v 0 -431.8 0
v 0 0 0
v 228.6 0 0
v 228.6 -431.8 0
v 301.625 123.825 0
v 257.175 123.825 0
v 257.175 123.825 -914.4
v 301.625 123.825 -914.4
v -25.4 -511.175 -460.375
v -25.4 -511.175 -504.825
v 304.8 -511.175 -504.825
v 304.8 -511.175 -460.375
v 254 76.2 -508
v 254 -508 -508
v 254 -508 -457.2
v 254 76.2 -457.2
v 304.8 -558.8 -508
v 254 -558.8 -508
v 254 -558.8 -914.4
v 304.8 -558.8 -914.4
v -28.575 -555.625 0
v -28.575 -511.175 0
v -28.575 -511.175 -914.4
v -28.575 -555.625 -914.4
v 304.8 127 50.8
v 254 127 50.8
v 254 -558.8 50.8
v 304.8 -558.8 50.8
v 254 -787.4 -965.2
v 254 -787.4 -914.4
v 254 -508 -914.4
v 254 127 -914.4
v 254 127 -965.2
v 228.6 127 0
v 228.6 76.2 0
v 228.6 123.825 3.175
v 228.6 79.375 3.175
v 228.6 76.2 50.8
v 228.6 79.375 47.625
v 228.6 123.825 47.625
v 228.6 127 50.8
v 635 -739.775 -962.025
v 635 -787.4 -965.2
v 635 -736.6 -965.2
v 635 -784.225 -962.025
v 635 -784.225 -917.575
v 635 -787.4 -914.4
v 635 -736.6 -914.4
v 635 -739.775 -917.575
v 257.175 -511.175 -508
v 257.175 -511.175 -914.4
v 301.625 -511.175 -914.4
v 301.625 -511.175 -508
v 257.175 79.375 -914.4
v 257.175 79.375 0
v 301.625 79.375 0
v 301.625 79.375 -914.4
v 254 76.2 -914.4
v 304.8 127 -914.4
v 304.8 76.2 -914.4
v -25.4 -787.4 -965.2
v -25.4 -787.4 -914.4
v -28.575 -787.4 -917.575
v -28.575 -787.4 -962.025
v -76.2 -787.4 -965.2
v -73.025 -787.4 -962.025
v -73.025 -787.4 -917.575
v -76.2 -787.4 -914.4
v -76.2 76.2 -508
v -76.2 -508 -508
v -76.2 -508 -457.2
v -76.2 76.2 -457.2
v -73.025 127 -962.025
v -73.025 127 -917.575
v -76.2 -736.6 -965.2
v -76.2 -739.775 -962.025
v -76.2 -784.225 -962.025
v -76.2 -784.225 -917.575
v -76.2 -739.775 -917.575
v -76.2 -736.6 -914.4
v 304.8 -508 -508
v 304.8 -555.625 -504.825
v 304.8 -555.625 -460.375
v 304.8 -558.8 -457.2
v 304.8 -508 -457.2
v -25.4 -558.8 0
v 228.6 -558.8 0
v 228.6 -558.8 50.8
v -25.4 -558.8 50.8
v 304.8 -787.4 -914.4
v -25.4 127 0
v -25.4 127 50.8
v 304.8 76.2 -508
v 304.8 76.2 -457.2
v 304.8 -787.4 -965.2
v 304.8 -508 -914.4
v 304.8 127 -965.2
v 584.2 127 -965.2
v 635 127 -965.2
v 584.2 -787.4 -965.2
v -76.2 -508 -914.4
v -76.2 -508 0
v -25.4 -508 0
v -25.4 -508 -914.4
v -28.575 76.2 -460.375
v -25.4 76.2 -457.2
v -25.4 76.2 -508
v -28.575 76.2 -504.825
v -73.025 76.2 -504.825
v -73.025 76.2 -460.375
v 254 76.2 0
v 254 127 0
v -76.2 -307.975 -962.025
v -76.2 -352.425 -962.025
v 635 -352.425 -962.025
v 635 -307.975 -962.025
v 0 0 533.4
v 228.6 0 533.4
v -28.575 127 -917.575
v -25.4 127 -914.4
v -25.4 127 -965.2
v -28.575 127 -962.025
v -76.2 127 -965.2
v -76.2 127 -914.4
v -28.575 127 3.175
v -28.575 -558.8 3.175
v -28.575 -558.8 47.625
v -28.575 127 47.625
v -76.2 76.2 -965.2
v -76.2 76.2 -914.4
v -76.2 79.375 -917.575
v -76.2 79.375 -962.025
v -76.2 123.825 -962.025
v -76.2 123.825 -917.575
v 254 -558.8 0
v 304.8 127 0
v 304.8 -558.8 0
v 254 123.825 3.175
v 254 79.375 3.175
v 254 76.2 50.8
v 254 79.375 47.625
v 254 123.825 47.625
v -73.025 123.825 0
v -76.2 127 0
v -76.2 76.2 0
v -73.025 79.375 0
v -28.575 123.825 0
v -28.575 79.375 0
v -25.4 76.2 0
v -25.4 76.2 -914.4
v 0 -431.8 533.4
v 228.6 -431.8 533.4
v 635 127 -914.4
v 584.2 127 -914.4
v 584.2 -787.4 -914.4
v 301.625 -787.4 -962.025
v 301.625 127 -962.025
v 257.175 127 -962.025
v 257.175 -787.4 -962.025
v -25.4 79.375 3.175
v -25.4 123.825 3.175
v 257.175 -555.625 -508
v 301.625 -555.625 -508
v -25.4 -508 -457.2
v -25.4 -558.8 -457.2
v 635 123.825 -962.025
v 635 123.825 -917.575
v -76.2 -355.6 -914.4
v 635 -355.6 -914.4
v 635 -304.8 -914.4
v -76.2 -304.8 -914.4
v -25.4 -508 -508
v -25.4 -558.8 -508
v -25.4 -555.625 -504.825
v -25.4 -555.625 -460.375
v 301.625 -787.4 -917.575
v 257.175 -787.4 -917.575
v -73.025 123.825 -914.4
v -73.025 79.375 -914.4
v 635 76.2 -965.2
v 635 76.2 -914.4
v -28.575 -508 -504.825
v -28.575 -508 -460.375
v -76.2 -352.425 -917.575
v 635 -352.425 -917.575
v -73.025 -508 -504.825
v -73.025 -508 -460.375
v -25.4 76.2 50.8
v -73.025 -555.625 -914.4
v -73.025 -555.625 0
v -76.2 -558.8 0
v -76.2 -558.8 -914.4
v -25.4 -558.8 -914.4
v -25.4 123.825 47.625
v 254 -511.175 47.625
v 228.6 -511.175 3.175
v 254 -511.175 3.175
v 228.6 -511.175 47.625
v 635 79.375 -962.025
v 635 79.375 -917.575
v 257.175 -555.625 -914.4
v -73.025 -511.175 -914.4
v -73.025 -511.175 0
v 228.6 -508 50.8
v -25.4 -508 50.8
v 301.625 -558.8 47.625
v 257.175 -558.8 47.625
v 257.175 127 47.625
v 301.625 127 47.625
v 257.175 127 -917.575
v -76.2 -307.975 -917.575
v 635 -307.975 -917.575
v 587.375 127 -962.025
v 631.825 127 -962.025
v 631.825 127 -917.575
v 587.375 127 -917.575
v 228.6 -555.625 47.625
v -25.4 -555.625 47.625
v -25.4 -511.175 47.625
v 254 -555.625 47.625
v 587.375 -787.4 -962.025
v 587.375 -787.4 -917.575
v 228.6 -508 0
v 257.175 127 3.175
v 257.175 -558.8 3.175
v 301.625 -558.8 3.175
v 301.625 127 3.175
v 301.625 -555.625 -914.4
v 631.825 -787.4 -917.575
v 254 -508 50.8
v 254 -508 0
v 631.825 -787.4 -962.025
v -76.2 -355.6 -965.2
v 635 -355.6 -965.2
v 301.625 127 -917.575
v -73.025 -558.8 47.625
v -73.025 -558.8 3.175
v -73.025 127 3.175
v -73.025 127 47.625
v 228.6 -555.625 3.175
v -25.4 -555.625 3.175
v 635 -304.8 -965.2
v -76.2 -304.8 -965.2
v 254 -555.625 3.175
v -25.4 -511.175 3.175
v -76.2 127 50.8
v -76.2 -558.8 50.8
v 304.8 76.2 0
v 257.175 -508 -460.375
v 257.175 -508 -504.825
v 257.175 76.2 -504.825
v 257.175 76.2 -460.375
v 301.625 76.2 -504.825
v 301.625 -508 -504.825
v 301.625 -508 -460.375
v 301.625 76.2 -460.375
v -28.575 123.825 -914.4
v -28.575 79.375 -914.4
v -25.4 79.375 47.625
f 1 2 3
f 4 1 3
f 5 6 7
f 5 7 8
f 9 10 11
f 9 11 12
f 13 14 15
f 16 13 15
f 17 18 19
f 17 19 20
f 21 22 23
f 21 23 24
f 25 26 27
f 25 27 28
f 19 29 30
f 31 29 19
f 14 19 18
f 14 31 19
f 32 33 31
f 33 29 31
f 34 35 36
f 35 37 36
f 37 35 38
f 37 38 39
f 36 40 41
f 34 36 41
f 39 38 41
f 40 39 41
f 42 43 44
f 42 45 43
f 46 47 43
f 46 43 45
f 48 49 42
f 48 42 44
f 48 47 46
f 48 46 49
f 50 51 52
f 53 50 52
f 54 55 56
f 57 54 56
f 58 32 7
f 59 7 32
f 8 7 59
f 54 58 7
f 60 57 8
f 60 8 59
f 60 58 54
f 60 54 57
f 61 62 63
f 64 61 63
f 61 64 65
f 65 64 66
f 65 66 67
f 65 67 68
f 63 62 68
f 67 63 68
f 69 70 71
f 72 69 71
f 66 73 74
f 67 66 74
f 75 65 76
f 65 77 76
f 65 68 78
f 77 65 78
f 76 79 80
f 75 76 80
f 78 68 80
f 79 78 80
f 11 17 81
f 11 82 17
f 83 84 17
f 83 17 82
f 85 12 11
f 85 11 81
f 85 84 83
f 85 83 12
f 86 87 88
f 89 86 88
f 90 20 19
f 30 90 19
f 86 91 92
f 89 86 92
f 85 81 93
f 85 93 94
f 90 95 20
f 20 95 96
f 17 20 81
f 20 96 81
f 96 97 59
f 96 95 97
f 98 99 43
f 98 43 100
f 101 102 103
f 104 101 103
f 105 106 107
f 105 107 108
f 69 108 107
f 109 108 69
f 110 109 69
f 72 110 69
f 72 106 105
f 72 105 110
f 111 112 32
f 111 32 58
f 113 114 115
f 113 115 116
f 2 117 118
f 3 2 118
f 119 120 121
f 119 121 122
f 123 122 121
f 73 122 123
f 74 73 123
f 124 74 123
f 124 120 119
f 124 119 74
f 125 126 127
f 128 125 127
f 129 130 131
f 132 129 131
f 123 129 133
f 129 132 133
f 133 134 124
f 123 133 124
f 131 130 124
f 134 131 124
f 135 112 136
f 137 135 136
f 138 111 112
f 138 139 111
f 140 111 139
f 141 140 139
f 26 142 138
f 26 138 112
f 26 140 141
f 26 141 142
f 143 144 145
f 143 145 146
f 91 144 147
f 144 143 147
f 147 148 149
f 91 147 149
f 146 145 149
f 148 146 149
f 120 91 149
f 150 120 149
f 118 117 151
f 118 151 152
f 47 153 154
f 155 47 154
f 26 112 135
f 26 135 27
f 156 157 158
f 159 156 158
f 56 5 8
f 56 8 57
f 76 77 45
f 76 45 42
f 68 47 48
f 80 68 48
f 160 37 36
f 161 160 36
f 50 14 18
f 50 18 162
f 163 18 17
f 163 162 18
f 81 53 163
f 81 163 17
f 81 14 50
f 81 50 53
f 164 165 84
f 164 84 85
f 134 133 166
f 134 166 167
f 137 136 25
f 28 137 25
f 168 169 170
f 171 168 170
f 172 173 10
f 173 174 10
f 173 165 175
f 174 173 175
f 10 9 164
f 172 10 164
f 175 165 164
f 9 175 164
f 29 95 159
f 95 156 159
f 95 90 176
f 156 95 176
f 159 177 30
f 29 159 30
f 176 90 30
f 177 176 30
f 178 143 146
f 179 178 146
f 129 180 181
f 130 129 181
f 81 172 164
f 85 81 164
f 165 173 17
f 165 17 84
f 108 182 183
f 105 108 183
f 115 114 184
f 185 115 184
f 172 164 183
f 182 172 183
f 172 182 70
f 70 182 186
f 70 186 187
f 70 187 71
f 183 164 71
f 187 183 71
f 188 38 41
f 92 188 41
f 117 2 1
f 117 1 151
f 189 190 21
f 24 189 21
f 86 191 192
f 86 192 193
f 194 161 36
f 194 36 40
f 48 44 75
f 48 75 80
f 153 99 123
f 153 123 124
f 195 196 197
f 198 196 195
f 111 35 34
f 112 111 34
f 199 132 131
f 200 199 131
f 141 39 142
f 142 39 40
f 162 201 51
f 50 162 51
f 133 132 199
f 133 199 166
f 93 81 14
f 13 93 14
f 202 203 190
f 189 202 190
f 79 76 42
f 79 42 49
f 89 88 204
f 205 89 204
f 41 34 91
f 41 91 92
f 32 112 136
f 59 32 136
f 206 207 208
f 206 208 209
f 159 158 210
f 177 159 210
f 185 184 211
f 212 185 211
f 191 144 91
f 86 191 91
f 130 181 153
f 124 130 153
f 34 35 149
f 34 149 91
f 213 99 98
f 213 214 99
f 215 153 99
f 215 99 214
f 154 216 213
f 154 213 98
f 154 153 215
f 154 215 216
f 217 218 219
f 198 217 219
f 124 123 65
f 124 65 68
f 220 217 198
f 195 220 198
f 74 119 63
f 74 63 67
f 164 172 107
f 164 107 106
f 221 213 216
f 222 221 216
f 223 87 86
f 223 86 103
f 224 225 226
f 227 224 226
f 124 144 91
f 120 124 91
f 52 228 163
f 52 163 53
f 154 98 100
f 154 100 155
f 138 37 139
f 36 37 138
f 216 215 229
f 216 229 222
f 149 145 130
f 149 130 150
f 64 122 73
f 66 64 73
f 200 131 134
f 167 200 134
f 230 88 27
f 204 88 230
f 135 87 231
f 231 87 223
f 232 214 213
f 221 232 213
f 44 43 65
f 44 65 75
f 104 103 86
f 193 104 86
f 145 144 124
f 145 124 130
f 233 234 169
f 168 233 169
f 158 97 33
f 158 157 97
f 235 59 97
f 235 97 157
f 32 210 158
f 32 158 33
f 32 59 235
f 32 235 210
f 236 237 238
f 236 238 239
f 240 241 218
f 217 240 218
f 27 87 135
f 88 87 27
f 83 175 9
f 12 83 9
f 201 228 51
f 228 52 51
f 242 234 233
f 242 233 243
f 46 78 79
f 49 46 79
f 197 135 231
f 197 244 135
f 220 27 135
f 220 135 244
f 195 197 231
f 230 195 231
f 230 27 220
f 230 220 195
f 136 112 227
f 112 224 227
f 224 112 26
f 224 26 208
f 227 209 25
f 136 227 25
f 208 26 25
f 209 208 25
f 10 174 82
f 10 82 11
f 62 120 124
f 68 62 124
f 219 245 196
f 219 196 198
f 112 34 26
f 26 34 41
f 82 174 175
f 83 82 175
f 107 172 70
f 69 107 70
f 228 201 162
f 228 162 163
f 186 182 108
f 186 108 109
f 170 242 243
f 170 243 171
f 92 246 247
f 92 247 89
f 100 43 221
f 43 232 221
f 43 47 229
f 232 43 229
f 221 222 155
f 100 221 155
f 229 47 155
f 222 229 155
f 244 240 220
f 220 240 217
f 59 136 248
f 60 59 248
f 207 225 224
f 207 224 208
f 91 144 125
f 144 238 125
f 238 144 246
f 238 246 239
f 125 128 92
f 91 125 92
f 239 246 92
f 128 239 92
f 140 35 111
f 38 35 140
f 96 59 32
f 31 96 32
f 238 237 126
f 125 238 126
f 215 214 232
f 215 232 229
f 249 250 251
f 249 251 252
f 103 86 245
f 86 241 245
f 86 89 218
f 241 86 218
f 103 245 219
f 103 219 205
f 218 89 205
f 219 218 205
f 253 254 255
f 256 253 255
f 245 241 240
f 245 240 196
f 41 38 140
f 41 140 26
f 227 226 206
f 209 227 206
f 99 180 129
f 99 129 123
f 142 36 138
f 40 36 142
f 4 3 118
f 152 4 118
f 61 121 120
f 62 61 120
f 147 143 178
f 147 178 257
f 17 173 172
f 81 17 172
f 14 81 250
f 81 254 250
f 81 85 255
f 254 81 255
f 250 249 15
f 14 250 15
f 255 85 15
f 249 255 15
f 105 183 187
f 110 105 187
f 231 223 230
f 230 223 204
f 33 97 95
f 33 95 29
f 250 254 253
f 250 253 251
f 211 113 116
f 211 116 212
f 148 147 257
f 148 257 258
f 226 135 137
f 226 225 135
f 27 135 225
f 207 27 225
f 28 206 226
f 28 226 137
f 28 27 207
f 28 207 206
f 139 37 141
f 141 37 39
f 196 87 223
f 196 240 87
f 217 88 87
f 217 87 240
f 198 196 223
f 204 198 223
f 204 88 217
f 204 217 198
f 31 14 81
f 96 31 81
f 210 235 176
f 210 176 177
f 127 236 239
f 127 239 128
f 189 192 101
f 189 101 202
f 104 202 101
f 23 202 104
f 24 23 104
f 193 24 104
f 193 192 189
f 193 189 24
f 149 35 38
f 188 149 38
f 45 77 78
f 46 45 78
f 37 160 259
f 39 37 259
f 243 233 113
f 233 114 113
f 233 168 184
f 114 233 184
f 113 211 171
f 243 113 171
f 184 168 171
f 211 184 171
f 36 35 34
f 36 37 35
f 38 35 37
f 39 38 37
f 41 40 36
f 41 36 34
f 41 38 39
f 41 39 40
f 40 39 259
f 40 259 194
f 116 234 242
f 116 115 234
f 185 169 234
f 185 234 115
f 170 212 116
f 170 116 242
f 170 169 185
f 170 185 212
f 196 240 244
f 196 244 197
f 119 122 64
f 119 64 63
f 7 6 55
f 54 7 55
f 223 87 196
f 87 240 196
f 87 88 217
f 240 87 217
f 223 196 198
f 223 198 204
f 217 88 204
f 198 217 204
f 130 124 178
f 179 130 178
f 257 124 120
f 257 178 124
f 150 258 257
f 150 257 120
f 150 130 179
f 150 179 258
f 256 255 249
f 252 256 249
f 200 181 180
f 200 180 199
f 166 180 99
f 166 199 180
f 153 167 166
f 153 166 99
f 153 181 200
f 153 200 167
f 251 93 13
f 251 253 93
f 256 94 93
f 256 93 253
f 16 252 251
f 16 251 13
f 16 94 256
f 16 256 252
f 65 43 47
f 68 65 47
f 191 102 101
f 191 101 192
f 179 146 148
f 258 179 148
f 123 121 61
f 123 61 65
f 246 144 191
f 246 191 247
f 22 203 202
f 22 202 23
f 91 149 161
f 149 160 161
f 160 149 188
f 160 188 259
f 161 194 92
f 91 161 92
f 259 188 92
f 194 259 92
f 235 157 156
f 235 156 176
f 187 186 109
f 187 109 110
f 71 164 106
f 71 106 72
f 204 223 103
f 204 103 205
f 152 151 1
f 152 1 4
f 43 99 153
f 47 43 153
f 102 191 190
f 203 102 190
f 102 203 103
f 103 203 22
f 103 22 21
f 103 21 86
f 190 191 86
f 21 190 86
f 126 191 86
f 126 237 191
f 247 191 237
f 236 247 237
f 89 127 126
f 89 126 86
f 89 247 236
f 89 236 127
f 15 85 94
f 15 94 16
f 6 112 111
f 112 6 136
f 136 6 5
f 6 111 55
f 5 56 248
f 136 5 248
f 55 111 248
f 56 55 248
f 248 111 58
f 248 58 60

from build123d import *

# Parameters (mm, degrees)
F0_W      = 228.6
F0_H      = 533.4
F1_DEPTH  = 431.8
F2_W      = 50.8
F2_H      = 50.8
F2_W_2    = 44.45
F2_H_2    = 44.45
F3_DEPTH  = 254
F4_DEPTH  = 25.4
F5_W      = 50.8
F5_H      = 50.8
F5_W_2    = 44.45
F5_H_2    = 44.45
F6_DEPTH  = 685.8
F7_W      = 50.8
F7_H      = 50.8
F7_W_2    = 44.45
F7_H_2    = 44.45
F8_DEPTH  = 914.4
F9_W      = 50.8
F9_H      = 50.8
F9_W_2    = 44.45
F9_H_2    = 44.45
F10_DEPTH = 914.4
F11_W     = 50.8
F11_H     = 50.8
F11_W_2   = 44.45
F11_H_2   = 44.45
F12_DEPTH = 711.2
F13_W     = 50.8
F13_H     = 50.8
F13_W_2   = 44.45
F13_H_2   = 44.45
F14_DEPTH = 406.4
F15_W     = 50.8
F15_H     = 50.8
F15_W_2   = 44.45
F15_H_2   = 44.45
F16_DEPTH = 330.2
F17_W     = 50.8
F17_H     = 50.8
F17_W_2   = 44.45
F17_H_2   = 44.45
F18_DEPTH = 584.2


with BuildPart() as f1:
    # F0 (on Front) → F1 (new body)
    with BuildSketch(Plane.XZ):
        with Locations((114.3, 266.7)):
            Rectangle(F0_W, F0_H)
    extrude(amount=F1_DEPTH)


with BuildPart() as f3:
    # F2 (on face) → F3 (new body)
    with BuildSketch(Plane.YZ.offset(228.6)):
        with Locations((-533.4, 25.4)):
            Rectangle(F2_W, F2_H)
        with Locations((-533.4, 25.4)):
            Rectangle(F2_W_2, F2_H_2, mode=Mode.SUBTRACT)
        with Locations((101.6, 25.4)):
            Rectangle(F2_W, F2_H)
        with Locations((101.6, 25.4)):
            Rectangle(F2_W_2, F2_H_2, mode=Mode.SUBTRACT)
    extrude(amount=-F3_DEPTH)


with BuildPart() as f4:
    # F2 (on face) → F4 (new body)
    with BuildSketch(Plane.YZ.offset(228.6)):
        with Locations((-533.4, 25.4)):
            Rectangle(F2_W, F2_H)
        with Locations((-533.4, 25.4)):
            Rectangle(F2_W_2, F2_H_2, mode=Mode.SUBTRACT)
        with Locations((101.6, 25.4)):
            Rectangle(F2_W, F2_H)
        with Locations((101.6, 25.4)):
            Rectangle(F2_W_2, F2_H_2, mode=Mode.SUBTRACT)
    extrude(amount=F4_DEPTH)


with BuildPart() as f6:
    # F5 (on face) → F6 (new body)
    with BuildSketch(Plane.XZ.offset(558.8)):
        with Locations((279.4, 25.4)):
            Rectangle(F5_W, F5_H)
        with Locations((279.4, 25.4)):
            Rectangle(F5_W_2, F5_H_2, mode=Mode.SUBTRACT)
        with Locations((-50.8, 25.4)):
            Rectangle(F5_W, F5_H)
        with Locations((-50.8, 25.4)):
            Rectangle(F5_W_2, F5_H_2, mode=Mode.SUBTRACT)
    extrude(amount=-F6_DEPTH)


with BuildPart() as f8:
    # F7 (on face) → F8 (new body)
    with BuildSketch(Plane(origin=(0, 0, 0), x_dir=(1, 0, 0), z_dir=(0, 0, -1))):
        with Locations((-50.8, -101.6)):
            Rectangle(F7_W, F7_H)
        with Locations((-50.8, -101.6)):
            Rectangle(F7_W_2, F7_H_2, mode=Mode.SUBTRACT)
        with Locations((279.4, -101.6)):
            Rectangle(F7_W, F7_H)
        with Locations((279.4, -101.6)):
            Rectangle(F7_W_2, F7_H_2, mode=Mode.SUBTRACT)
        with Locations((-50.8, 533.4)):
            Rectangle(F7_W, F7_H)
        with Locations((-50.8, 533.4)):
            Rectangle(F7_W_2, F7_H_2, mode=Mode.SUBTRACT)
    extrude(amount=F8_DEPTH)


with BuildPart() as f10:
    # F9 (on face) → F10 (new body)
    with BuildSketch(Plane(origin=(0, 127, 0), x_dir=(-1, 0, 0), z_dir=(0, 1, 0))):
        with Locations((50.8, -939.8)):
            Rectangle(F9_W, F9_H)
        with Locations((50.8, -939.8)):
            Rectangle(F9_W_2, F9_H_2, mode=Mode.SUBTRACT)
        with Locations((-279.4, -939.8)):
            Rectangle(F9_W, F9_H)
        with Locations((-279.4, -939.8)):
            Rectangle(F9_W_2, F9_H_2, mode=Mode.SUBTRACT)
        with Locations((-609.6, -939.8)):
            Rectangle(F9_W, F9_H)
        with Locations((-609.6, -939.8)):
            Rectangle(F9_W_2, F9_H_2, mode=Mode.SUBTRACT)
    extrude(amount=-F10_DEPTH)

    # F13 (on face) → F14 (join)
    with BuildSketch(Plane.XY.offset(-914.4)):
        with Locations((279.4, -533.4)):
            Rectangle(F13_W, F13_H)
        with Locations((279.4, -533.4)):
            Rectangle(F13_W_2, F13_H_2, mode=Mode.SUBTRACT)
    extrude(amount=F14_DEPTH)


with BuildPart() as f12:
    # F11 (on face) → F12 (new body)
    with BuildSketch(Plane.YZ.offset(635)):
        with Locations((101.6, -939.8)):
            Rectangle(F11_W, F11_H)
        with Locations((101.6, -939.8)):
            Rectangle(F11_W_2, F11_H_2, mode=Mode.SUBTRACT)
        with Locations((-330.2, -939.8)):
            Rectangle(F11_W, F11_H)
        with Locations((-330.2, -939.8)):
            Rectangle(F11_W_2, F11_H_2, mode=Mode.SUBTRACT)
        with Locations((-762, -939.8)):
            Rectangle(F11_W, F11_H)
        with Locations((-762, -939.8)):
            Rectangle(F11_W_2, F11_H_2, mode=Mode.SUBTRACT)
    extrude(amount=-F12_DEPTH)


with BuildPart() as f16:
    # F15 (on face) → F16 (new body)
    with BuildSketch(Plane.YZ.offset(304.8)):
        with Locations((-533.4, -482.6)):
            Rectangle(F15_W, F15_H)
        with Locations((-533.4, -482.6)):
            Rectangle(F15_W_2, F15_H_2, mode=Mode.SUBTRACT)
    extrude(amount=-F16_DEPTH)


with BuildPart() as f18:
    # F17 (on face) → F18 (new body)
    with BuildSketch(Plane(origin=(0, -508, 0), x_dir=(-1, 0, 0), z_dir=(0, 1, 0))):
        with Locations((-279.4, -482.6)):
            Rectangle(F17_W, F17_H)
        with Locations((-279.4, -482.6)):
            Rectangle(F17_W_2, F17_H_2, mode=Mode.SUBTRACT)
        with Locations((50.8, -482.6)):
            Rectangle(F17_W, F17_H)
        with Locations((50.8, -482.6)):
            Rectangle(F17_W_2, F17_H_2, mode=Mode.SUBTRACT)
    extrude(amount=F18_DEPTH)


solid = Compound([f1.part, f3.part, f4.part, f6.part, f8.part, f10.part, f12.part, f16.part, f18.part])
